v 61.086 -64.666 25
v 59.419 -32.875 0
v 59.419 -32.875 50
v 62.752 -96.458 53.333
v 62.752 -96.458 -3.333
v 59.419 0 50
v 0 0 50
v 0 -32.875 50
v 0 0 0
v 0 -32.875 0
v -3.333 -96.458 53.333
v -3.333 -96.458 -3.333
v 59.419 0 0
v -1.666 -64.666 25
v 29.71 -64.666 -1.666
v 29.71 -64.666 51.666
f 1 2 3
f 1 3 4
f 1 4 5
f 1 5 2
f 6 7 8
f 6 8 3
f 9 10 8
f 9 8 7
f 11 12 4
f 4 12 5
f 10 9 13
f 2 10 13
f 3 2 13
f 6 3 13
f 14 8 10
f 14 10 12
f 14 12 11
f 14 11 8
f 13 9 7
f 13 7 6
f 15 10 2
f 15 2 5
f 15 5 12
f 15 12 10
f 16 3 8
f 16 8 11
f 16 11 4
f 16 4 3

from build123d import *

# Parameters (mm, degrees)
F0_W      = 59.4193041325
F0_H      = 32.8746140003
F1_DEPTH  = 50
F1_FACE_W = 59.4193041325
F1_FACE_H = 50
F2_DEPTH  = 63.5828971863
F2_TAPER  = -3.0006


with BuildPart() as f1:
    # F0 (on Top) → F1 (new body)
    with BuildSketch(Plane.XY):
        with Locations((29.7096520662, -16.4373070002)):
            Rectangle(F0_W, F0_H)
    extrude(amount=F1_DEPTH)

    # F1_face (on face) → F2 (join)
    with BuildSketch(Plane(origin=(29.7096520662, -32.8746140003, 25), x_dir=(1, 0, 0), z_dir=(0, -1, 0))):
        Rectangle(F1_FACE_W, F1_FACE_H)
    extrude(amount=F2_DEPTH, taper=F2_TAPER)


solid = f1.part
